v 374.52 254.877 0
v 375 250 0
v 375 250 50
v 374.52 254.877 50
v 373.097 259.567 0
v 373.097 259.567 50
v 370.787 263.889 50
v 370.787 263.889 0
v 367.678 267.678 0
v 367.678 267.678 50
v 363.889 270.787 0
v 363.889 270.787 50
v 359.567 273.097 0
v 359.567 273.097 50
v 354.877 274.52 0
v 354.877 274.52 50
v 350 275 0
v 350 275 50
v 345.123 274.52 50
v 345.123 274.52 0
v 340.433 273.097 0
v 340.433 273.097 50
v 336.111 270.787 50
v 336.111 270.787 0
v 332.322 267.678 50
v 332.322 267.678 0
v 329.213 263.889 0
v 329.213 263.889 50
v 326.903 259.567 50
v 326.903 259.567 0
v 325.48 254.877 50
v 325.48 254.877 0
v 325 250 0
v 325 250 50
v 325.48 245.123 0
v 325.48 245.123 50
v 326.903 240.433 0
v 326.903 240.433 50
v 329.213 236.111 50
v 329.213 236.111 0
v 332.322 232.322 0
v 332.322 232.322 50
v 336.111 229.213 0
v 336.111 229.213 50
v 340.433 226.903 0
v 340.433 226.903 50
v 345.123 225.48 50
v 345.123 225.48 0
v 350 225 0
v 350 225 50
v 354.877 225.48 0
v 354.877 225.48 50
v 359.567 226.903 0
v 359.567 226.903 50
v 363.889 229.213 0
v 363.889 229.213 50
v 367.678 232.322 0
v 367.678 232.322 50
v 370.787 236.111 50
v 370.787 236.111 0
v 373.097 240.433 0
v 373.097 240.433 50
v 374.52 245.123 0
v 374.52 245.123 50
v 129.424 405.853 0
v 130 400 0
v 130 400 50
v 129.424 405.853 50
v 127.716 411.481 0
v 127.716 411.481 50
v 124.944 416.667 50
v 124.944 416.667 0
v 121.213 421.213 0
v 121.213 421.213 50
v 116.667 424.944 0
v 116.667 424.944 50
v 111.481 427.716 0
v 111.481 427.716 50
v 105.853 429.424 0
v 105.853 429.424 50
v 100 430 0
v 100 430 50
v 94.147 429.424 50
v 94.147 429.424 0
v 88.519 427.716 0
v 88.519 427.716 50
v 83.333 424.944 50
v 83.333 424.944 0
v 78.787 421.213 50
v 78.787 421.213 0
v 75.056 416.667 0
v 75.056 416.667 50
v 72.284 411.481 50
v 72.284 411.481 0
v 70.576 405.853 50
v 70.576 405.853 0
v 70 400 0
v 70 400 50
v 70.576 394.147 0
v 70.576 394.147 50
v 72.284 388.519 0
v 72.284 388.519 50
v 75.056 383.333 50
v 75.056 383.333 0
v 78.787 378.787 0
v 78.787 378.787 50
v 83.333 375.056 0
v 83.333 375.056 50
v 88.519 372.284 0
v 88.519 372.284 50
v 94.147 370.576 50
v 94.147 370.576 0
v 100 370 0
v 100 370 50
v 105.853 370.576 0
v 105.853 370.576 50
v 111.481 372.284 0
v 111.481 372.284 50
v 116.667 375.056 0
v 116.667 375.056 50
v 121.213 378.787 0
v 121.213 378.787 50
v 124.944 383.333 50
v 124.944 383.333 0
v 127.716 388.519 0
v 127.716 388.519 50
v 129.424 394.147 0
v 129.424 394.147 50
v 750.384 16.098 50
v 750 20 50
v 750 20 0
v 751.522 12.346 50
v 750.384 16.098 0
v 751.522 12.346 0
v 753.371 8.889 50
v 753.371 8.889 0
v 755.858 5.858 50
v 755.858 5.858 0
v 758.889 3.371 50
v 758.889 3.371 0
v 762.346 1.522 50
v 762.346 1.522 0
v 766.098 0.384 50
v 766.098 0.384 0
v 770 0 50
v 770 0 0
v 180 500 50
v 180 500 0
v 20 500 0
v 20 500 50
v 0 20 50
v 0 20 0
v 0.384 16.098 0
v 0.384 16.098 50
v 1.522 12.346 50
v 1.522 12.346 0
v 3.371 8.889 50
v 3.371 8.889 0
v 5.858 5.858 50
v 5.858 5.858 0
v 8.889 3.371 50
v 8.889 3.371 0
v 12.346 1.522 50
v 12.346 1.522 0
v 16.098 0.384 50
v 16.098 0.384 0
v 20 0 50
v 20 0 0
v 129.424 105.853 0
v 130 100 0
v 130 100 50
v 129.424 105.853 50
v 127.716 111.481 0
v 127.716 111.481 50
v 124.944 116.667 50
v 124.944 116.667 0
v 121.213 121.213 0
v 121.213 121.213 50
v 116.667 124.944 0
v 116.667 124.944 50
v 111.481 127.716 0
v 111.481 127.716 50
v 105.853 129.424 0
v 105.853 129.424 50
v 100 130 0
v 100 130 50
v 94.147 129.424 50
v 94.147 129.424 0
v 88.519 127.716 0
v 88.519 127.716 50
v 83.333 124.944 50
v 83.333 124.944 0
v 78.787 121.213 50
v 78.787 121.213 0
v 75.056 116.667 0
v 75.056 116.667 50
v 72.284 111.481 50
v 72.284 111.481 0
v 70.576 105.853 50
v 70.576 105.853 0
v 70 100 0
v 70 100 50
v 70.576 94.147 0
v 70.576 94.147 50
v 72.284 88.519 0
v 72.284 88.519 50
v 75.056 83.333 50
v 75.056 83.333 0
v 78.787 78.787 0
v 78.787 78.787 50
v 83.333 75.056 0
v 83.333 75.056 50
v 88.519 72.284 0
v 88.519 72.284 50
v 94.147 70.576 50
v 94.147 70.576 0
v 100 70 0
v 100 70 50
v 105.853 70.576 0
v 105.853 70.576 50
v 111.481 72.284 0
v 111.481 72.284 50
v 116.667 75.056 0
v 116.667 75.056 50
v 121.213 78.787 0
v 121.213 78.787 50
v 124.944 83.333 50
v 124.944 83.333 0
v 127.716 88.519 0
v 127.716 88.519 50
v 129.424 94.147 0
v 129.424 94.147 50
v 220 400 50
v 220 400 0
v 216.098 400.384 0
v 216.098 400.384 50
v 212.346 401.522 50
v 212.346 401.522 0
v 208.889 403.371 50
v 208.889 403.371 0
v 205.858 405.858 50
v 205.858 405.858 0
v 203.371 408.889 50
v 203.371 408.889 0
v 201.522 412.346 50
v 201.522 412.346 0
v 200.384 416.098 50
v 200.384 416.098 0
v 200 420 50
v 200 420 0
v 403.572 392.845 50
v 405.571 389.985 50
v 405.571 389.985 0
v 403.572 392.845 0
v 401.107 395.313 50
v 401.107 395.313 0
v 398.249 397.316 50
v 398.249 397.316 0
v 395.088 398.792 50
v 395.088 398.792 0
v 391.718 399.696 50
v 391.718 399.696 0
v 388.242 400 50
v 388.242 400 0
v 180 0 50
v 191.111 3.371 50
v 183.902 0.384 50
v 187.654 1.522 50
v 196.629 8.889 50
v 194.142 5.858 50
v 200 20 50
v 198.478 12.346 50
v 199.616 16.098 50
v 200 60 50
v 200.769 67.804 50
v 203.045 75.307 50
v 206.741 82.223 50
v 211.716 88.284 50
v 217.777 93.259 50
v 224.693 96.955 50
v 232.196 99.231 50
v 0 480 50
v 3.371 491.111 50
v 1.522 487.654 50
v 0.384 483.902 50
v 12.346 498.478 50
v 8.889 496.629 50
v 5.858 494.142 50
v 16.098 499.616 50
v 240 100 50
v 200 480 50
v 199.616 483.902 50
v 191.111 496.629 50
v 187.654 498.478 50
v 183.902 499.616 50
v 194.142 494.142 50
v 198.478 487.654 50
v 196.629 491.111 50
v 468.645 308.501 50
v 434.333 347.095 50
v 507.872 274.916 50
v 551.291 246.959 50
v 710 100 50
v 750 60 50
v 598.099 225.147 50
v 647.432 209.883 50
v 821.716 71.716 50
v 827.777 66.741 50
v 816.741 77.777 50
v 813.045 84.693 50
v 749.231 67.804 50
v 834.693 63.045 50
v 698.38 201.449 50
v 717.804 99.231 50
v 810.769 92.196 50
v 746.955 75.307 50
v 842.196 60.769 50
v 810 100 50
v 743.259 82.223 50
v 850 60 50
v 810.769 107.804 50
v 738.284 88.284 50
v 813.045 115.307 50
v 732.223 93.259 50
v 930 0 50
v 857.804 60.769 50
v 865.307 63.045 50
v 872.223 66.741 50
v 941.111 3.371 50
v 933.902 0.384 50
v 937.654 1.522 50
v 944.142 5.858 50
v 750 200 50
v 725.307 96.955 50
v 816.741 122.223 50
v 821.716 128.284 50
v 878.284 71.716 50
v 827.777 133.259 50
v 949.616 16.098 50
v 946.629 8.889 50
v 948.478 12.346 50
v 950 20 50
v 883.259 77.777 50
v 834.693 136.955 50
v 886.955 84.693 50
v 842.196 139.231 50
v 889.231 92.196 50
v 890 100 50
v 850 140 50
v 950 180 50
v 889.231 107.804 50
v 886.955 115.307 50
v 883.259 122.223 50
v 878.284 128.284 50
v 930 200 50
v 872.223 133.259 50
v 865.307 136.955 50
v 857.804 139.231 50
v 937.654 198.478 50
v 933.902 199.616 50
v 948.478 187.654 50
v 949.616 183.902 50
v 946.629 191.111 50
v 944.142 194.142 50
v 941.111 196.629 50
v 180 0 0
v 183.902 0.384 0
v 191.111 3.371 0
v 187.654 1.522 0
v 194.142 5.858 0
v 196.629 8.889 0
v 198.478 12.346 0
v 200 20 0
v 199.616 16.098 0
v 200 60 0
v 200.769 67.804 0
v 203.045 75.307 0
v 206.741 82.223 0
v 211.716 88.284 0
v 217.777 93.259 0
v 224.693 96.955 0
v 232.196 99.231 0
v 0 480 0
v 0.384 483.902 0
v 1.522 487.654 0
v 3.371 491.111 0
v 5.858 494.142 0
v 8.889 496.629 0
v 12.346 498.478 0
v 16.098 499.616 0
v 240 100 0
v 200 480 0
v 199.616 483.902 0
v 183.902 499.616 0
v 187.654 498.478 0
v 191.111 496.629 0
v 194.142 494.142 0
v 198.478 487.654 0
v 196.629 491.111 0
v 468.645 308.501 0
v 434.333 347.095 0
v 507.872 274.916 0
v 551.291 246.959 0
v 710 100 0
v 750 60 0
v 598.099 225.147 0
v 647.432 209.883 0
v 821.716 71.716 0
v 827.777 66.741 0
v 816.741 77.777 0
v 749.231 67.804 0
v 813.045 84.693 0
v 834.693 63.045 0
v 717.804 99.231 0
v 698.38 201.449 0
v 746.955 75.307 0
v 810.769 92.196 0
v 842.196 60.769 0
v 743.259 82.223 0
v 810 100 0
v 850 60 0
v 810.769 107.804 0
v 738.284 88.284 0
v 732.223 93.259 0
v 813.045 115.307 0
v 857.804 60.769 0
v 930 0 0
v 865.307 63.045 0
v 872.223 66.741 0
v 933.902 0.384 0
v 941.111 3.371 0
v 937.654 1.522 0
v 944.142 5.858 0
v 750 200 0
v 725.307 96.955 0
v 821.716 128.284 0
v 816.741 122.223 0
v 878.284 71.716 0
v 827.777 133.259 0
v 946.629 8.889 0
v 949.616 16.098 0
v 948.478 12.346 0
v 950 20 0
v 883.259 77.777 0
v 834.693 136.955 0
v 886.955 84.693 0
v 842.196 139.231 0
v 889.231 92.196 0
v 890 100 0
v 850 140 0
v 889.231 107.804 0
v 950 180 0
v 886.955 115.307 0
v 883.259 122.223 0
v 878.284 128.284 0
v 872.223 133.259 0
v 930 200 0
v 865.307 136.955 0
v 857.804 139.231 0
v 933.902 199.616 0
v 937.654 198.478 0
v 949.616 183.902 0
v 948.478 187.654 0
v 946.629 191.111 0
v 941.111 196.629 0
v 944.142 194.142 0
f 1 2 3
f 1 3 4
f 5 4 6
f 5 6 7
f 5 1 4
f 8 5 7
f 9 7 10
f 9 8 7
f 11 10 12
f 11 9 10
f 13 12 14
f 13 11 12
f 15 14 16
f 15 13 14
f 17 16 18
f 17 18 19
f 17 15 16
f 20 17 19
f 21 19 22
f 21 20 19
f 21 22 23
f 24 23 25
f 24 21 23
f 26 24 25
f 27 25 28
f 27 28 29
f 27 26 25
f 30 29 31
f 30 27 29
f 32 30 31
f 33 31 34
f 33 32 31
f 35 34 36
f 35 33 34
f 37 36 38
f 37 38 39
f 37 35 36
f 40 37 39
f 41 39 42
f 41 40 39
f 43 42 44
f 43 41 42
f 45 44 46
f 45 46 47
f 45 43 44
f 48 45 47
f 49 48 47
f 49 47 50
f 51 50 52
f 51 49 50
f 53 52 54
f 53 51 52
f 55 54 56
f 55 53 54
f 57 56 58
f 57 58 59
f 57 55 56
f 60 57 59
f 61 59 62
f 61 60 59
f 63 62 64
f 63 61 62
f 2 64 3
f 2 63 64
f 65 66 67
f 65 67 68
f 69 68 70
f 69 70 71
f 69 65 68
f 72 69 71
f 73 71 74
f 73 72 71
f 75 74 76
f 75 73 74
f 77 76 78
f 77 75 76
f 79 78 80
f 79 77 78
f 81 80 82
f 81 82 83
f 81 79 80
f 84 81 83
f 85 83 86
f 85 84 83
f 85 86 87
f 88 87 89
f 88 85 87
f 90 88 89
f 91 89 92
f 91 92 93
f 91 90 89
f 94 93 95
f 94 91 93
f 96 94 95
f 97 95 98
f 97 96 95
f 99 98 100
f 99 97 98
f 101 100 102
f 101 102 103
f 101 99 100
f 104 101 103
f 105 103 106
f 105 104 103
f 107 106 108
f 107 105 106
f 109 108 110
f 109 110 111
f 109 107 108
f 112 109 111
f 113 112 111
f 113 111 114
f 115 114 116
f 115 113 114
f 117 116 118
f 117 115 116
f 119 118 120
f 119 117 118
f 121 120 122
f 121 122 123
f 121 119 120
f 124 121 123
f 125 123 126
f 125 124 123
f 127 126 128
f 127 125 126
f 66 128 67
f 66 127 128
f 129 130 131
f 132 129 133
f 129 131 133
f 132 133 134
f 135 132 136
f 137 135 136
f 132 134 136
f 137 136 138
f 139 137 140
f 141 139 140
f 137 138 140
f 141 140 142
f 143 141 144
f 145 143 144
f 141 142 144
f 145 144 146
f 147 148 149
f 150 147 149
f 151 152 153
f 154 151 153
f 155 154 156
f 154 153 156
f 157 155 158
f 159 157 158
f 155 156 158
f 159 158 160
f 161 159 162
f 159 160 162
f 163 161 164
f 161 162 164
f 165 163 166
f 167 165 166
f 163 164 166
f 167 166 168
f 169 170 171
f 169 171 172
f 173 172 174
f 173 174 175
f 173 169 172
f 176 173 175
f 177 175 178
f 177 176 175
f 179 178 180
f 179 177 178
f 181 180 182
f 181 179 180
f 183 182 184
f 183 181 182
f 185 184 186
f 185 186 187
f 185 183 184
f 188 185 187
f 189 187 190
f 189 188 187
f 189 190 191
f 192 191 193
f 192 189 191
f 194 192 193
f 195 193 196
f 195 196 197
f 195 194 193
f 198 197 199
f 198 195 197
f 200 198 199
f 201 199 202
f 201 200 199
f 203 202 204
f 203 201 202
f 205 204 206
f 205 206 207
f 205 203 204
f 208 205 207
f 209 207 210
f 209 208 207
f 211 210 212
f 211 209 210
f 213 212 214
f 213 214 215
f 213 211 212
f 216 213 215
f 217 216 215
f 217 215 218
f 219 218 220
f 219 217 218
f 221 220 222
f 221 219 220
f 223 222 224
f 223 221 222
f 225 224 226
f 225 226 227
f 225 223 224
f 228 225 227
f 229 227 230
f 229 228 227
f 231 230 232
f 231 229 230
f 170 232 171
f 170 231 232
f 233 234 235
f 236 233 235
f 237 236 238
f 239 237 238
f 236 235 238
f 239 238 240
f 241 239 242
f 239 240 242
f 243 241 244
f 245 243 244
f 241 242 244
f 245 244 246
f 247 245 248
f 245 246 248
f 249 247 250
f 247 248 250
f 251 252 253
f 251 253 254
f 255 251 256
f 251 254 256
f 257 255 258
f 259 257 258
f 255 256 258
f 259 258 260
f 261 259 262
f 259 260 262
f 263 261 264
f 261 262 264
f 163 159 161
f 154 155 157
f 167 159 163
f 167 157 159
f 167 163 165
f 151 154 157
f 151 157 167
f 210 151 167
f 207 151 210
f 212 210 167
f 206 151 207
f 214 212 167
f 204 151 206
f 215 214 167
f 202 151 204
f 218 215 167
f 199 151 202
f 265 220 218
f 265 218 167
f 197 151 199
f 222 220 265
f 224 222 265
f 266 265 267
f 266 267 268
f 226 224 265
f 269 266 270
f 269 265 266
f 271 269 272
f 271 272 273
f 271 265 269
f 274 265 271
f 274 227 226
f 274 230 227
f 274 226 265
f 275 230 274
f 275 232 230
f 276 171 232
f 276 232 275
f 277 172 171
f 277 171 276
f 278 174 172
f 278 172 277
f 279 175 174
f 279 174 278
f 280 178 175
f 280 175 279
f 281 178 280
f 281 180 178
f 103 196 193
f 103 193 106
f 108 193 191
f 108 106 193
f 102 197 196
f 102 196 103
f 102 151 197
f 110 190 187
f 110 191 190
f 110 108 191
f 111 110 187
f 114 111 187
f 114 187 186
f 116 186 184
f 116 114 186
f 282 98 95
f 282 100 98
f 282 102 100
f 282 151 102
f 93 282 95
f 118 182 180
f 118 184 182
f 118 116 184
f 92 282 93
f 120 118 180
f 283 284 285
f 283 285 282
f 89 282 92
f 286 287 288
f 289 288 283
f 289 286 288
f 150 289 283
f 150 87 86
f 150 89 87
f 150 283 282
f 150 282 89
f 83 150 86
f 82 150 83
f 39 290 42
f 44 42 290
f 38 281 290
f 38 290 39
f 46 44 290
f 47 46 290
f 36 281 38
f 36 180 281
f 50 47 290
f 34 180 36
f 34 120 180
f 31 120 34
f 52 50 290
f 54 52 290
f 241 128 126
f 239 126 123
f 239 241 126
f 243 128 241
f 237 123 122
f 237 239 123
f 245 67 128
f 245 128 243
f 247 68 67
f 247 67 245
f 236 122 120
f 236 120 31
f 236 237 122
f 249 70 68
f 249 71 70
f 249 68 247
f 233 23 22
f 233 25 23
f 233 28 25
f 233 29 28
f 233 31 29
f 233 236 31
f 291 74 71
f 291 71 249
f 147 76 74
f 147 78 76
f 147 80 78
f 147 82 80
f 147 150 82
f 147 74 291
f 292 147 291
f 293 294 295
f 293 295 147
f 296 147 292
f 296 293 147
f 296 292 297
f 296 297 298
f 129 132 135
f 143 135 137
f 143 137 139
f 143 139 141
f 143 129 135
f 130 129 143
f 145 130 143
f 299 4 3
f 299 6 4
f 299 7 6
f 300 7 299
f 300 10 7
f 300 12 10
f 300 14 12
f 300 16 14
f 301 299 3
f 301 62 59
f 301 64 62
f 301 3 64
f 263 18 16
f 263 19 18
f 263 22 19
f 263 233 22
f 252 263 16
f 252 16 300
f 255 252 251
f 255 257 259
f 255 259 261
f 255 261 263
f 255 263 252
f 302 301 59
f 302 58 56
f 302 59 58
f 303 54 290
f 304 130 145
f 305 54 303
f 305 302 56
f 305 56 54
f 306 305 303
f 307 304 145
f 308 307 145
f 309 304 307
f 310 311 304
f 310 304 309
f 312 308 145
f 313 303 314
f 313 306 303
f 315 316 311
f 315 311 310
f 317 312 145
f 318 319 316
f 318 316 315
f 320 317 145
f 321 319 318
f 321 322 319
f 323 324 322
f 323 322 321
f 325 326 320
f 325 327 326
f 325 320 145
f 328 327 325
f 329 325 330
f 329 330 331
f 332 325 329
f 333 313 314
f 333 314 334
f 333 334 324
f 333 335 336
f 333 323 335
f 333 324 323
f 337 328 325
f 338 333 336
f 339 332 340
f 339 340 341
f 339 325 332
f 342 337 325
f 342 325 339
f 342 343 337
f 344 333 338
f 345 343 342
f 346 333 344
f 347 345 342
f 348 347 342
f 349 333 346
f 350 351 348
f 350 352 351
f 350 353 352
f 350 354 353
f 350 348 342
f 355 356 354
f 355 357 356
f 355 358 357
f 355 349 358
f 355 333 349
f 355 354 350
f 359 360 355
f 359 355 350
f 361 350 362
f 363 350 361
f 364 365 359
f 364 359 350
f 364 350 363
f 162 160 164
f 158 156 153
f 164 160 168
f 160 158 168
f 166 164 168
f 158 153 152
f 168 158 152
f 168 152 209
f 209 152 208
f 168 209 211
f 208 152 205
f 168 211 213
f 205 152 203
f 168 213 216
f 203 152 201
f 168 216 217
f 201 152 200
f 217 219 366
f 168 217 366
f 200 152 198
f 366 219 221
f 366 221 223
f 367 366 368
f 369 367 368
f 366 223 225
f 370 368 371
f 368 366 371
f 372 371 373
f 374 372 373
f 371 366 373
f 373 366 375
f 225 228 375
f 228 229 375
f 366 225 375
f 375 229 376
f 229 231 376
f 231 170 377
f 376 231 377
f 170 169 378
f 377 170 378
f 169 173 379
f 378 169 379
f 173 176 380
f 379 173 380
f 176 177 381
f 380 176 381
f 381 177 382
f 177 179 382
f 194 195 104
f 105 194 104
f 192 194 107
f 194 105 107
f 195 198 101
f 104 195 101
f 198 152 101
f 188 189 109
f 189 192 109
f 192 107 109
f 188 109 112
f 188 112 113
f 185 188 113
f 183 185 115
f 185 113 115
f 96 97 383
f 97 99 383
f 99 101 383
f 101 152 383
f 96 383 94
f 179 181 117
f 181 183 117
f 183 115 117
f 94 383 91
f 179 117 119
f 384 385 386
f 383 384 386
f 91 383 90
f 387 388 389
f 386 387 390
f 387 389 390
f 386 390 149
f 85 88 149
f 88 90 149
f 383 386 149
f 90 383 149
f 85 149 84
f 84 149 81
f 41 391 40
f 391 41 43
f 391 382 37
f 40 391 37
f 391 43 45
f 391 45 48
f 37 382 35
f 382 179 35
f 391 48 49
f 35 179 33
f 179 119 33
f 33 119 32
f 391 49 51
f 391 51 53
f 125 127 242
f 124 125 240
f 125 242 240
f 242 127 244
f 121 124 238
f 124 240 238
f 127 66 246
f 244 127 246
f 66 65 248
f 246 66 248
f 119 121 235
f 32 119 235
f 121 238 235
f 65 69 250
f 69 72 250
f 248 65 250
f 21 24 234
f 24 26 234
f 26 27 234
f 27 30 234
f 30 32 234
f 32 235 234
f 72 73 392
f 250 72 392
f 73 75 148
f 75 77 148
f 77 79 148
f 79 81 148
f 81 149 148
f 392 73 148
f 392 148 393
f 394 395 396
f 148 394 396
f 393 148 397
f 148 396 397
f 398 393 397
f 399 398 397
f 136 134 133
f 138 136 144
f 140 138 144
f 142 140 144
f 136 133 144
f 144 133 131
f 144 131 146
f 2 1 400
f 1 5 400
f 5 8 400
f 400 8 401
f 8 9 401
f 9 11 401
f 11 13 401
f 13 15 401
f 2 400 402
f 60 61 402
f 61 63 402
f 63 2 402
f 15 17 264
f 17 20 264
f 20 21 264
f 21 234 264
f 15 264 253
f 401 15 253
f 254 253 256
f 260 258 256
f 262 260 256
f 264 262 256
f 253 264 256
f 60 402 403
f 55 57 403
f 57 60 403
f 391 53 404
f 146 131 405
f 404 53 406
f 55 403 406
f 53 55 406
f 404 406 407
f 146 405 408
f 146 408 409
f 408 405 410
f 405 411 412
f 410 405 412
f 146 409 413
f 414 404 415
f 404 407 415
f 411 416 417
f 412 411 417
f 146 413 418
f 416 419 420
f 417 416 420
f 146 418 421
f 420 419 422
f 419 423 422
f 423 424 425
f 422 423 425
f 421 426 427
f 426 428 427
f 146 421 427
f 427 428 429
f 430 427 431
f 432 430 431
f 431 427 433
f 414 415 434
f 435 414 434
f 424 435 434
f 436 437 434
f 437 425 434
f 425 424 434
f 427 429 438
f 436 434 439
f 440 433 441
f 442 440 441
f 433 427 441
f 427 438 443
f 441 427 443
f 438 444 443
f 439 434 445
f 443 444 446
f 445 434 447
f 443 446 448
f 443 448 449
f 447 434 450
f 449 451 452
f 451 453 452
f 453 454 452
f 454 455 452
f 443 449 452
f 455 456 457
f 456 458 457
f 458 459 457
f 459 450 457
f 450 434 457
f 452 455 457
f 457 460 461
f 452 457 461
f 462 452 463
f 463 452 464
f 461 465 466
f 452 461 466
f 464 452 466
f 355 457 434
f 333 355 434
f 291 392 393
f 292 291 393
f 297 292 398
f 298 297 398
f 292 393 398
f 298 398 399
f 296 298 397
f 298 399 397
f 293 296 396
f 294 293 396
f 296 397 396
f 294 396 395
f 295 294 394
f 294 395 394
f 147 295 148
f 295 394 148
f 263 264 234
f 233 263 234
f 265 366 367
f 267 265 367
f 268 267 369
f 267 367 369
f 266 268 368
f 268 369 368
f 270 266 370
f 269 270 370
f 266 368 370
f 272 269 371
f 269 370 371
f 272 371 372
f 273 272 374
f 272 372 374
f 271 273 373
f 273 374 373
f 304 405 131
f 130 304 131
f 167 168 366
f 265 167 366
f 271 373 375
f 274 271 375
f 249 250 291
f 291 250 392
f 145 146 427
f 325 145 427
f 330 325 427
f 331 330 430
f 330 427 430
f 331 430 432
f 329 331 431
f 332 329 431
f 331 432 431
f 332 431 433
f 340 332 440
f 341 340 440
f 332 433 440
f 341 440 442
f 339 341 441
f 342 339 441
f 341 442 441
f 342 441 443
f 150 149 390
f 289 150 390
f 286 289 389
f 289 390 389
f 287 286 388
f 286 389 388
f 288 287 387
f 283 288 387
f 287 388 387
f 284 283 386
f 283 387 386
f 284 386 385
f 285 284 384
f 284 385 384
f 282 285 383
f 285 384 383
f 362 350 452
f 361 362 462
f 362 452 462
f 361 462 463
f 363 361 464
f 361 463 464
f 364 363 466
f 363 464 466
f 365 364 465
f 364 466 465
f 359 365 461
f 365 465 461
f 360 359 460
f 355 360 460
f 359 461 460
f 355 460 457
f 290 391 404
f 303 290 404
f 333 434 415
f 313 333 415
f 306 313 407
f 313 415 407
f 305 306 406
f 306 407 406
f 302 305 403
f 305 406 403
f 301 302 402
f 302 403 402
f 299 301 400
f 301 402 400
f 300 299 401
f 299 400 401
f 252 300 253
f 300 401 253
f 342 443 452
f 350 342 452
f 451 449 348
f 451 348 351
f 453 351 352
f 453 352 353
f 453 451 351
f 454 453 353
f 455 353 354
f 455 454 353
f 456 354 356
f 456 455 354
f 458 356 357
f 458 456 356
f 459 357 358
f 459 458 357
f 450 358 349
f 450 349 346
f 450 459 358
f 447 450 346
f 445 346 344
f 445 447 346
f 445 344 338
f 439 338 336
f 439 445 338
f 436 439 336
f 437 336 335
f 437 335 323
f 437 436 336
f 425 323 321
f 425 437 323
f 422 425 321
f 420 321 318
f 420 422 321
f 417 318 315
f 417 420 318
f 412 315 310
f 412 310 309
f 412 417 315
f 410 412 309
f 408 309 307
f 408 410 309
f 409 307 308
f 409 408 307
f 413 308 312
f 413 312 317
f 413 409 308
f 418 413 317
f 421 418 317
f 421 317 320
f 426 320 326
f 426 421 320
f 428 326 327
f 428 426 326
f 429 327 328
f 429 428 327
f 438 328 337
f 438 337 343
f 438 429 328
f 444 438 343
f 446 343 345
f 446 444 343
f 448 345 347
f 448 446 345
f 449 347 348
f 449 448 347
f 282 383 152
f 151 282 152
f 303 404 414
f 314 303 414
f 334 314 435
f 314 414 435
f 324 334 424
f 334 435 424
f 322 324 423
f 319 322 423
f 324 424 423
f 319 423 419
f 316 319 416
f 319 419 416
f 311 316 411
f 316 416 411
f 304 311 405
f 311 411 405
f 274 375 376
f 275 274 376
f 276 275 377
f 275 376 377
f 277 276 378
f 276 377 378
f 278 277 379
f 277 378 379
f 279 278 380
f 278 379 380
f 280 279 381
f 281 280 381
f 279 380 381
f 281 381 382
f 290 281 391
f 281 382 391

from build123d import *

# Parameters (mm, degrees)
IZIM1_R                     = 30
IZIM1_R_2                   = 25
IZIM1_R_3                   = 40
Y_KSEKLIK_EKSTR_ZYON1_DEPTH = 50


with BuildPart() as part:
    # Çizim1 → Yükseklik-Ekstrüzyon1 (new body)
    with BuildSketch(Plane.XY):
        with BuildLine():
            Line((200, 20), (200, 60))
            ThreePointArc((200, 60), (211.715728753, 88.284271247), (240, 100))
            Line((240, 100), (710, 100))
            ThreePointArc((710, 100), (738.284271247, 88.284271247), (750, 60))
            Line((750, 60), (750, 20))
            ThreePointArc((750, 20), (755.857864376, 5.857864376), (770, 0))
            Line((770, 0), (930, 0))
            ThreePointArc((930, 0), (944.142135624, 5.857864376), (950, 20))
            Line((950, 20), (950, 180))
            ThreePointArc((950, 180), (944.142135624, 194.142135624), (930, 200))
            Line((930, 200), (750, 200))
            ThreePointArc((750, 200), (551.290675458, 246.959096298), (405.571126809, 389.984847569))
            ThreePointArc((405.571126809, 389.984847569), (398.249452654, 397.316133393), (388.241879306, 400))
            Line((388.241879306, 400), (220, 400))
            ThreePointArc((220, 400), (205.857864376, 405.857864376), (200, 420))
            Line((200, 420), (200, 480))
            ThreePointArc((200, 480), (194.142135624, 494.142135624), (180, 500))
            Line((180, 500), (20, 500))
            ThreePointArc((20, 500), (5.857864376, 494.142135624), (0, 480))
            Line((0, 480), (0, 20))
            ThreePointArc((0, 20), (5.857864376, 5.857864376), (20, 0))
            Line((20, 0), (180, 0))
            ThreePointArc((180, 0), (194.142135624, 5.857864376), (200, 20))
        make_face()
        with Locations((100, 400)):
            Circle(IZIM1_R, mode=Mode.SUBTRACT)
        with Locations((100, 100)):
            Circle(IZIM1_R, mode=Mode.SUBTRACT)
        with Locations((350, 250)):
            Circle(IZIM1_R_2, mode=Mode.SUBTRACT)
        with Locations((850, 100)):
            Circle(IZIM1_R_3, mode=Mode.SUBTRACT)
    extrude(amount=Y_KSEKLIK_EKSTR_ZYON1_DEPTH)


solid = part.part
